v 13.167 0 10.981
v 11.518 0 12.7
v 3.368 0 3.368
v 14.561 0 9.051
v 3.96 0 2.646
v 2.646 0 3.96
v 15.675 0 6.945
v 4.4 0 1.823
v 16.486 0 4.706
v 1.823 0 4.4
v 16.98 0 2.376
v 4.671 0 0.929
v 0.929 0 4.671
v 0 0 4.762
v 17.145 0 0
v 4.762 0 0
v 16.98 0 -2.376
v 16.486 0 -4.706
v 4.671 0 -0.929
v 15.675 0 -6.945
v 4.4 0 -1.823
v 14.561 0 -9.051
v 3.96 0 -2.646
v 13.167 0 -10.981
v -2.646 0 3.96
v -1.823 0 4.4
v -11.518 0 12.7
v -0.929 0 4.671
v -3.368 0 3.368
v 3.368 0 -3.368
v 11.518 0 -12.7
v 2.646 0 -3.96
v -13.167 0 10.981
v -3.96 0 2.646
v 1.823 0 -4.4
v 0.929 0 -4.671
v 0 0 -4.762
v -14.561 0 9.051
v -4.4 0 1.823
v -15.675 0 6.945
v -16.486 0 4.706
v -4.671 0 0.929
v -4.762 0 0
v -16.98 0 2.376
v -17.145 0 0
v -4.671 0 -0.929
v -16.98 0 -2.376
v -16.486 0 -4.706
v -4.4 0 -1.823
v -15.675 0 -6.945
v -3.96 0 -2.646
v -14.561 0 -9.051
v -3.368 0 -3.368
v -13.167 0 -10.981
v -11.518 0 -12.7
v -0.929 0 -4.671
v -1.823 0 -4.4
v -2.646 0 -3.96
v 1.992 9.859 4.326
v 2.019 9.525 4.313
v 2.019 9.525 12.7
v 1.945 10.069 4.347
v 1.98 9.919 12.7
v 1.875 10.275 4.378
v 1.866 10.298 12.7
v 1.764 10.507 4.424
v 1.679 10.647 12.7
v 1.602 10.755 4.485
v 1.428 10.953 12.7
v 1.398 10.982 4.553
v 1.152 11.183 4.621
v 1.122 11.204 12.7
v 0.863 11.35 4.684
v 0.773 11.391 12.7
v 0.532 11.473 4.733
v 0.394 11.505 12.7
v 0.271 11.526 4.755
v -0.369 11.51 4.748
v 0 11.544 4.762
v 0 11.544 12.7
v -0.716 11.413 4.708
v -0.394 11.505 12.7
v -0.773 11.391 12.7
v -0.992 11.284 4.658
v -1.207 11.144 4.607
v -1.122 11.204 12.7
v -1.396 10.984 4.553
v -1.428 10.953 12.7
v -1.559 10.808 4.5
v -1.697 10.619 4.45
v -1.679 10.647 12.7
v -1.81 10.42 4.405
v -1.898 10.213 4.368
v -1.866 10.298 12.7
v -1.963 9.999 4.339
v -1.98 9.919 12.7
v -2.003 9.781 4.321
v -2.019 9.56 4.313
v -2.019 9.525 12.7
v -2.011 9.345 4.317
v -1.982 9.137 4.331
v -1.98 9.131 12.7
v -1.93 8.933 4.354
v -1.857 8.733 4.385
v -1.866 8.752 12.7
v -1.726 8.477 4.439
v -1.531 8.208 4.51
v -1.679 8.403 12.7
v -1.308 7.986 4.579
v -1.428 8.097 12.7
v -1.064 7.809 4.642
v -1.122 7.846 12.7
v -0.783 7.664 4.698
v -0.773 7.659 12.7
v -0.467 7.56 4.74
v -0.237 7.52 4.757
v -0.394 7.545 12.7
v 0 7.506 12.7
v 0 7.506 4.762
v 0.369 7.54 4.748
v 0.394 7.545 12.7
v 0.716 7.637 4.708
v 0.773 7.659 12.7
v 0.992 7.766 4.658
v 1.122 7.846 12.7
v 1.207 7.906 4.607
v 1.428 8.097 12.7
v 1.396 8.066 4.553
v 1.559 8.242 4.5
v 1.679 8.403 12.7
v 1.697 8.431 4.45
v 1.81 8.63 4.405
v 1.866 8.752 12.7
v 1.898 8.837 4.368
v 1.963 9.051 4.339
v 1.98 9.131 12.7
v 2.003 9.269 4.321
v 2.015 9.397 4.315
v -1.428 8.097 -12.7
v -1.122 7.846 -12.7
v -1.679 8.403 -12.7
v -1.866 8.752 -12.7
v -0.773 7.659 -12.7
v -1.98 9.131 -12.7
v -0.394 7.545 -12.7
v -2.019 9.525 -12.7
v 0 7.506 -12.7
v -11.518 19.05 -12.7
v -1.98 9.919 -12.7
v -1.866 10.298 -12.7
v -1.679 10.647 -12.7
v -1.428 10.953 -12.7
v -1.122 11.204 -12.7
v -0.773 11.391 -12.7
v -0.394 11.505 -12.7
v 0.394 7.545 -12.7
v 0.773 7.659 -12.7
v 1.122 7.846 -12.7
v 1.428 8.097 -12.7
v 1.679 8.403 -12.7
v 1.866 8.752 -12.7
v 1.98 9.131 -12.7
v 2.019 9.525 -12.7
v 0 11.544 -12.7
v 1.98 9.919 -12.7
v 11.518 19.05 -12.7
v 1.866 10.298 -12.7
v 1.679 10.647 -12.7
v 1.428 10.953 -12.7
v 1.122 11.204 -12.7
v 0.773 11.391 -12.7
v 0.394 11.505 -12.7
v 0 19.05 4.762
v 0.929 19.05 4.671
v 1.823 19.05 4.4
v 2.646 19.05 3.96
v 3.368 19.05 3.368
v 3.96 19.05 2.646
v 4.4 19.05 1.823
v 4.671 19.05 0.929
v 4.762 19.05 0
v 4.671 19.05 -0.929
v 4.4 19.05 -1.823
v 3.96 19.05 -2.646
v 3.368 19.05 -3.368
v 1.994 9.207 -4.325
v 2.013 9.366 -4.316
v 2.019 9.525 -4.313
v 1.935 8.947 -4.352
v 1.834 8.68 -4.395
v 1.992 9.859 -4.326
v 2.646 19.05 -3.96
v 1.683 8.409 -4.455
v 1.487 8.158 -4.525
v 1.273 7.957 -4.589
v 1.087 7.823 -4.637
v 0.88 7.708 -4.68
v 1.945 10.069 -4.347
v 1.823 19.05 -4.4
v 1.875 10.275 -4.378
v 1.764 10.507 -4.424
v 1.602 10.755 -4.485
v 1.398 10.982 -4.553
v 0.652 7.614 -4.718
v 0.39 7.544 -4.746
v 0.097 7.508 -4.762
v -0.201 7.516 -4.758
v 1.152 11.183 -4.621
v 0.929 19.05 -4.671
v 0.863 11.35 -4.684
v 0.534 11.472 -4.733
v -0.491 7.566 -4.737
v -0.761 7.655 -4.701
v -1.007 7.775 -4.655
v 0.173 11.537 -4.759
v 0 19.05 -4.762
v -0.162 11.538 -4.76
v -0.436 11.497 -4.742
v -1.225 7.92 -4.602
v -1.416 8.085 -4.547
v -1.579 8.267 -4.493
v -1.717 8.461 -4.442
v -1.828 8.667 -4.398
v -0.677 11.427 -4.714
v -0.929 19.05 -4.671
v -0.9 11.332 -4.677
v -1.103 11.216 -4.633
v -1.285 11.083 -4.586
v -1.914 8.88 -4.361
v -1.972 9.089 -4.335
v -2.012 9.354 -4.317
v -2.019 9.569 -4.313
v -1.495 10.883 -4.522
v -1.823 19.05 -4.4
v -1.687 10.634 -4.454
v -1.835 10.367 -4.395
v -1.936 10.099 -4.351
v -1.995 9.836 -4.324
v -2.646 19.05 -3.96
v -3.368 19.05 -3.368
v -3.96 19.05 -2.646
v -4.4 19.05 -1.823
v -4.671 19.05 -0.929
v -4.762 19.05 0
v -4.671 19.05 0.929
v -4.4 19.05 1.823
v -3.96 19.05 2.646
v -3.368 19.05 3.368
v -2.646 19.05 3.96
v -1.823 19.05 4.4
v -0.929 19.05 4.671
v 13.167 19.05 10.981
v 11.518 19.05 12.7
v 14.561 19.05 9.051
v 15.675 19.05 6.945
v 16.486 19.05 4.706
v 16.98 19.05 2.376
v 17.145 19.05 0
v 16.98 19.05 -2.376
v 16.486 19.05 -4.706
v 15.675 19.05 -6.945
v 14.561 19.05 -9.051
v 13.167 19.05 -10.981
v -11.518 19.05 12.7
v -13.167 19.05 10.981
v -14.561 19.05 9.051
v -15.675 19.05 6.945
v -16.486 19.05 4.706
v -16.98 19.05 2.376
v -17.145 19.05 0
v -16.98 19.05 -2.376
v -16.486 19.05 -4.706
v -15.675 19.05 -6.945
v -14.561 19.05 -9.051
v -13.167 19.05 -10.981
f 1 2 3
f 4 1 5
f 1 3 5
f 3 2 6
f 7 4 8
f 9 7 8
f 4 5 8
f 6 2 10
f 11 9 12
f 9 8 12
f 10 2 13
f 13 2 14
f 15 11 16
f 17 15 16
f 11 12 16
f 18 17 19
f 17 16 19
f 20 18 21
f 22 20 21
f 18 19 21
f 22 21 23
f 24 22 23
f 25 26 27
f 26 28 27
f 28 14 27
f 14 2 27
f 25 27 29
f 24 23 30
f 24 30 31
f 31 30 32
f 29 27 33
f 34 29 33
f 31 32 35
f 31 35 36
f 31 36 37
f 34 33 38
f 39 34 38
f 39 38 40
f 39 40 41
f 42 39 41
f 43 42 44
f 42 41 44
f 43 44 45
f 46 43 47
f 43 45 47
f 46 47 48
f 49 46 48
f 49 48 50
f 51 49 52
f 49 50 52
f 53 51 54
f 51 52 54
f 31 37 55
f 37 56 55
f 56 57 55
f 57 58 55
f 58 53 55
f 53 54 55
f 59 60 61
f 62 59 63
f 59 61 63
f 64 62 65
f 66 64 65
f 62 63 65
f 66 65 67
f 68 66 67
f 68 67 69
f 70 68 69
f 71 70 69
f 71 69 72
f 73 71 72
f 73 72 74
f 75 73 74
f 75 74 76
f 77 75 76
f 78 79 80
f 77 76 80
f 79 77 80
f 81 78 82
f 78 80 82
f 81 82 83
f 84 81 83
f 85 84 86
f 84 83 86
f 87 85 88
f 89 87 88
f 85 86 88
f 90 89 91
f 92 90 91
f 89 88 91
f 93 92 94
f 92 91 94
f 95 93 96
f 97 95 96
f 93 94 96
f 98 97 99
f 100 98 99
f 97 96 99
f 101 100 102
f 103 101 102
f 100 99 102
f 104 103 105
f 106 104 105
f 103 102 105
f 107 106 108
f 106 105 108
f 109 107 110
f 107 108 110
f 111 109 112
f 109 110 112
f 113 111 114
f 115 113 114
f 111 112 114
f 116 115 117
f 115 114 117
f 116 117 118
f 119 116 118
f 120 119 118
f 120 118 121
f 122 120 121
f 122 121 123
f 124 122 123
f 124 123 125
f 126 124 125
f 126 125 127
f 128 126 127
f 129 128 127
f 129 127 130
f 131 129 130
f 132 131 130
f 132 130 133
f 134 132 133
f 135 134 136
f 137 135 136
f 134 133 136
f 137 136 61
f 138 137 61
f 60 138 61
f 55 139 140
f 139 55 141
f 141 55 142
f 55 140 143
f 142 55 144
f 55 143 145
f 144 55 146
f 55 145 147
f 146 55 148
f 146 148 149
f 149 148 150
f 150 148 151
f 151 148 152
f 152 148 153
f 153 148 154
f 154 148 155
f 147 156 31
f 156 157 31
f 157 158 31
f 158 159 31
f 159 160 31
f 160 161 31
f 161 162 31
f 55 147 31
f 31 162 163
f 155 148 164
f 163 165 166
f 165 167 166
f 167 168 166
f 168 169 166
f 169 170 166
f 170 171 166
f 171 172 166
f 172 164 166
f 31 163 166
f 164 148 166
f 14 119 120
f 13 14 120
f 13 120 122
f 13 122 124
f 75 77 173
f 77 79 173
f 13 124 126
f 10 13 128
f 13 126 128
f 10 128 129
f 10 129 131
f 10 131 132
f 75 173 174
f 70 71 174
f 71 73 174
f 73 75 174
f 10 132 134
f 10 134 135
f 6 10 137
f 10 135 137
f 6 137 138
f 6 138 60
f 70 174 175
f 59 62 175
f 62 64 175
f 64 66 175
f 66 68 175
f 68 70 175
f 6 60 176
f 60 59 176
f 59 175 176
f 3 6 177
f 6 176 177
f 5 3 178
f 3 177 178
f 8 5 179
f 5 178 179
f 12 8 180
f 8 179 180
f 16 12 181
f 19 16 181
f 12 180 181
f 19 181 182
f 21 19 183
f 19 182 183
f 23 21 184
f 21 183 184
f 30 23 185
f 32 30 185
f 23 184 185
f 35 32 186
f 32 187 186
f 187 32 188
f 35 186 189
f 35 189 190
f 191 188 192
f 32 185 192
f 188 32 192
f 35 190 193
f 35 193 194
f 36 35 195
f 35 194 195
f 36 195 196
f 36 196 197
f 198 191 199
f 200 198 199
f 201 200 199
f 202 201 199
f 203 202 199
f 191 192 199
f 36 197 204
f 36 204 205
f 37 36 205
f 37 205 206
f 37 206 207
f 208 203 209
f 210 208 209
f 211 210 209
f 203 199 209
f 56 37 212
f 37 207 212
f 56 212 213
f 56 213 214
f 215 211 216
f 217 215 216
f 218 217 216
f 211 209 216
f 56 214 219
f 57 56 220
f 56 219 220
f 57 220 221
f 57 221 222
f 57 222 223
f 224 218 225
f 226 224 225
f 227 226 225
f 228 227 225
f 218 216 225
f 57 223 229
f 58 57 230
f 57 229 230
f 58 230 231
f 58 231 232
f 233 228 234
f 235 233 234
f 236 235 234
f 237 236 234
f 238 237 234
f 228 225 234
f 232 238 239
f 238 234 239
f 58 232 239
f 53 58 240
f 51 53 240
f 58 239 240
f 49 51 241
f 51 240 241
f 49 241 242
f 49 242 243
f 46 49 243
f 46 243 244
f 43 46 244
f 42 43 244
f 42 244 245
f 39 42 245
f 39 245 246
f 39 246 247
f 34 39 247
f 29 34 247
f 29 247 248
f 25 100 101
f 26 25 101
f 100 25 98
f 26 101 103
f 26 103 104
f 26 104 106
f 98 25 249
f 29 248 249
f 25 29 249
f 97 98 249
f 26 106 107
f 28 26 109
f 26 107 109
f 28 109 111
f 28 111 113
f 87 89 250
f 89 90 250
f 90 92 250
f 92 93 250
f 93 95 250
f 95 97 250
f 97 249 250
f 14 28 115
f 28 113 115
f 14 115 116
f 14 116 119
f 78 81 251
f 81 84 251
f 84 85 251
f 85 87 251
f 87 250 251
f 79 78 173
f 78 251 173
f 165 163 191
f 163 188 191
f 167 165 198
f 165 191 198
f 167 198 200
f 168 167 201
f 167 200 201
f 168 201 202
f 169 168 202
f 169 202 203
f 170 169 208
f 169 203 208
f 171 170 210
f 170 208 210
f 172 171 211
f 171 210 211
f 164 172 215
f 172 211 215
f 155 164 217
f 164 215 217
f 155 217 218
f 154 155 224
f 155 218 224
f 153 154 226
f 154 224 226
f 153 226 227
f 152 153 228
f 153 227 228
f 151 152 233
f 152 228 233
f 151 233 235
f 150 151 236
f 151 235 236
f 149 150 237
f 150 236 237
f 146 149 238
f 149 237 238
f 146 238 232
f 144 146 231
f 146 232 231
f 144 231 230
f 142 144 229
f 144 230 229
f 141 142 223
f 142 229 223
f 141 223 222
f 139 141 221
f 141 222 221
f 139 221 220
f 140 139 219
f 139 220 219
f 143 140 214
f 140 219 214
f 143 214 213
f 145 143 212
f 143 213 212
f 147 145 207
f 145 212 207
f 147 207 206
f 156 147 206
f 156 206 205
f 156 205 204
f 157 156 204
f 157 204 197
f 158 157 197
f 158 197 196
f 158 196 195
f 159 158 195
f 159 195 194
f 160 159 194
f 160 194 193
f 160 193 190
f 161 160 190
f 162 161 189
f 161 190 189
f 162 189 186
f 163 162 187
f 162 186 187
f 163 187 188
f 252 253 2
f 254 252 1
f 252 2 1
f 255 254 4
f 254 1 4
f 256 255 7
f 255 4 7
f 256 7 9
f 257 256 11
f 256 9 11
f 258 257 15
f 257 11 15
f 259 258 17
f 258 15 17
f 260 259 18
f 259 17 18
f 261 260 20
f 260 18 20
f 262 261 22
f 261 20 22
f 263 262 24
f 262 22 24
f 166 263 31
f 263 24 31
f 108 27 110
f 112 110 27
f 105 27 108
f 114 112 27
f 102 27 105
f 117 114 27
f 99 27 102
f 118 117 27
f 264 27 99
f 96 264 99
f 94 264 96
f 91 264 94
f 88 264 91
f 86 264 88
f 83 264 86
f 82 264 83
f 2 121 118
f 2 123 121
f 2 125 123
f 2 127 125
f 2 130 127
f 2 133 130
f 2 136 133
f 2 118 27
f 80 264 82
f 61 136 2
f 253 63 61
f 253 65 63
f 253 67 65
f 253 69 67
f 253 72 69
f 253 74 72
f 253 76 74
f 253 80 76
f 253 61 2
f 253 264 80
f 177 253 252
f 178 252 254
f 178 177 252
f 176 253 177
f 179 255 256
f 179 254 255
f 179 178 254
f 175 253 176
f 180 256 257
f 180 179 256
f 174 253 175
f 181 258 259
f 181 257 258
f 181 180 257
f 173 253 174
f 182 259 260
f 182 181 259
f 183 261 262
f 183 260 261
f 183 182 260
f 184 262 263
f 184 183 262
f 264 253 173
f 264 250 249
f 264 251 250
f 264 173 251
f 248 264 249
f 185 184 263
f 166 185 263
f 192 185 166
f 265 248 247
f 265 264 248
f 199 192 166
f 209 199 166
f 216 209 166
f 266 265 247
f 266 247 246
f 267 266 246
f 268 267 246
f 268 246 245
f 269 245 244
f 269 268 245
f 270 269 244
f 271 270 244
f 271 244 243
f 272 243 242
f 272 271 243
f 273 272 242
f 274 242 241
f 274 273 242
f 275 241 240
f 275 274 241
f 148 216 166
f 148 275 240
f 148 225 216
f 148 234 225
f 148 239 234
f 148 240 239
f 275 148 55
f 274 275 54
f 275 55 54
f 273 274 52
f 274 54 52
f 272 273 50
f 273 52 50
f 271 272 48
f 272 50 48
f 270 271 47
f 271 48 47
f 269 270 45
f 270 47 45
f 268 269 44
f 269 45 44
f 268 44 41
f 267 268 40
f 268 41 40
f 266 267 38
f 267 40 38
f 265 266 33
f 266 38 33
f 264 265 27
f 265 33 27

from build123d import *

# Parameters (mm, degrees)
SKETCH1_R                 = 17.145
BOSS_EXTRUDE1_DEPTH       = 19.05
SKETCH2_R                 = 4.7625
CUT_EXTRUDE1_DEPTH        = 31.835118777
SKETCH3_R                 = 2.0193
F_10_32_TAPPED_HOLE_DEPTH = 50.8
SKETCH4_OUTSIDE_W         = 46.71
SKETCH4_OUTSIDE_H         = 46.71
SKETCH4_OUTSIDE_W_2       = 34.29
SKETCH4_OUTSIDE_H_2       = 25.4
FIT_IN_SLOT_DEPTH         = 31.83511895


with BuildPart() as part:
    # Sketch1 → Boss-Extrude1 (new body)
    with BuildSketch(Plane(origin=(0, 0, 0), x_dir=(1, 0, 0), z_dir=(0, 1, 0))):
        with Locations(Location((0, 0, 0), (0, 0, 90))):
            Circle(SKETCH1_R)
    extrude(amount=BOSS_EXTRUDE1_DEPTH)

    # Sketch2 → Cut-Extrude1 (cut, through all)
    with BuildSketch(Plane(origin=(0, 19.05, 0), x_dir=(1, 0, 0), z_dir=(0, 1, 0))):
        with Locations(Location((0, 0, 0), (0, 0, 270))):
            Circle(SKETCH2_R)
    extrude(amount=-CUT_EXTRUDE1_DEPTH, mode=Mode.SUBTRACT)

    # Sketch3 → 10-32 Tapped Hole (cut, symmetric)
    with BuildSketch(Plane.XY):
        with Locations((0, 9.525)):
            Circle(SKETCH3_R)
    extrude(amount=F_10_32_TAPPED_HOLE_DEPTH, both=True, mode=Mode.SUBTRACT)

    # Sketch4 outside → Fit in Slot (cut, through all)
    with BuildSketch(Plane(origin=(0, 19.05, 0), x_dir=(1, 0, 0), z_dir=(0, 1, 0))):
        Rectangle(SKETCH4_OUTSIDE_W, SKETCH4_OUTSIDE_H)
        Rectangle(SKETCH4_OUTSIDE_W_2, SKETCH4_OUTSIDE_H_2, mode=Mode.SUBTRACT)
    extrude(amount=-FIT_IN_SLOT_DEPTH, mode=Mode.SUBTRACT)


solid = part.part
